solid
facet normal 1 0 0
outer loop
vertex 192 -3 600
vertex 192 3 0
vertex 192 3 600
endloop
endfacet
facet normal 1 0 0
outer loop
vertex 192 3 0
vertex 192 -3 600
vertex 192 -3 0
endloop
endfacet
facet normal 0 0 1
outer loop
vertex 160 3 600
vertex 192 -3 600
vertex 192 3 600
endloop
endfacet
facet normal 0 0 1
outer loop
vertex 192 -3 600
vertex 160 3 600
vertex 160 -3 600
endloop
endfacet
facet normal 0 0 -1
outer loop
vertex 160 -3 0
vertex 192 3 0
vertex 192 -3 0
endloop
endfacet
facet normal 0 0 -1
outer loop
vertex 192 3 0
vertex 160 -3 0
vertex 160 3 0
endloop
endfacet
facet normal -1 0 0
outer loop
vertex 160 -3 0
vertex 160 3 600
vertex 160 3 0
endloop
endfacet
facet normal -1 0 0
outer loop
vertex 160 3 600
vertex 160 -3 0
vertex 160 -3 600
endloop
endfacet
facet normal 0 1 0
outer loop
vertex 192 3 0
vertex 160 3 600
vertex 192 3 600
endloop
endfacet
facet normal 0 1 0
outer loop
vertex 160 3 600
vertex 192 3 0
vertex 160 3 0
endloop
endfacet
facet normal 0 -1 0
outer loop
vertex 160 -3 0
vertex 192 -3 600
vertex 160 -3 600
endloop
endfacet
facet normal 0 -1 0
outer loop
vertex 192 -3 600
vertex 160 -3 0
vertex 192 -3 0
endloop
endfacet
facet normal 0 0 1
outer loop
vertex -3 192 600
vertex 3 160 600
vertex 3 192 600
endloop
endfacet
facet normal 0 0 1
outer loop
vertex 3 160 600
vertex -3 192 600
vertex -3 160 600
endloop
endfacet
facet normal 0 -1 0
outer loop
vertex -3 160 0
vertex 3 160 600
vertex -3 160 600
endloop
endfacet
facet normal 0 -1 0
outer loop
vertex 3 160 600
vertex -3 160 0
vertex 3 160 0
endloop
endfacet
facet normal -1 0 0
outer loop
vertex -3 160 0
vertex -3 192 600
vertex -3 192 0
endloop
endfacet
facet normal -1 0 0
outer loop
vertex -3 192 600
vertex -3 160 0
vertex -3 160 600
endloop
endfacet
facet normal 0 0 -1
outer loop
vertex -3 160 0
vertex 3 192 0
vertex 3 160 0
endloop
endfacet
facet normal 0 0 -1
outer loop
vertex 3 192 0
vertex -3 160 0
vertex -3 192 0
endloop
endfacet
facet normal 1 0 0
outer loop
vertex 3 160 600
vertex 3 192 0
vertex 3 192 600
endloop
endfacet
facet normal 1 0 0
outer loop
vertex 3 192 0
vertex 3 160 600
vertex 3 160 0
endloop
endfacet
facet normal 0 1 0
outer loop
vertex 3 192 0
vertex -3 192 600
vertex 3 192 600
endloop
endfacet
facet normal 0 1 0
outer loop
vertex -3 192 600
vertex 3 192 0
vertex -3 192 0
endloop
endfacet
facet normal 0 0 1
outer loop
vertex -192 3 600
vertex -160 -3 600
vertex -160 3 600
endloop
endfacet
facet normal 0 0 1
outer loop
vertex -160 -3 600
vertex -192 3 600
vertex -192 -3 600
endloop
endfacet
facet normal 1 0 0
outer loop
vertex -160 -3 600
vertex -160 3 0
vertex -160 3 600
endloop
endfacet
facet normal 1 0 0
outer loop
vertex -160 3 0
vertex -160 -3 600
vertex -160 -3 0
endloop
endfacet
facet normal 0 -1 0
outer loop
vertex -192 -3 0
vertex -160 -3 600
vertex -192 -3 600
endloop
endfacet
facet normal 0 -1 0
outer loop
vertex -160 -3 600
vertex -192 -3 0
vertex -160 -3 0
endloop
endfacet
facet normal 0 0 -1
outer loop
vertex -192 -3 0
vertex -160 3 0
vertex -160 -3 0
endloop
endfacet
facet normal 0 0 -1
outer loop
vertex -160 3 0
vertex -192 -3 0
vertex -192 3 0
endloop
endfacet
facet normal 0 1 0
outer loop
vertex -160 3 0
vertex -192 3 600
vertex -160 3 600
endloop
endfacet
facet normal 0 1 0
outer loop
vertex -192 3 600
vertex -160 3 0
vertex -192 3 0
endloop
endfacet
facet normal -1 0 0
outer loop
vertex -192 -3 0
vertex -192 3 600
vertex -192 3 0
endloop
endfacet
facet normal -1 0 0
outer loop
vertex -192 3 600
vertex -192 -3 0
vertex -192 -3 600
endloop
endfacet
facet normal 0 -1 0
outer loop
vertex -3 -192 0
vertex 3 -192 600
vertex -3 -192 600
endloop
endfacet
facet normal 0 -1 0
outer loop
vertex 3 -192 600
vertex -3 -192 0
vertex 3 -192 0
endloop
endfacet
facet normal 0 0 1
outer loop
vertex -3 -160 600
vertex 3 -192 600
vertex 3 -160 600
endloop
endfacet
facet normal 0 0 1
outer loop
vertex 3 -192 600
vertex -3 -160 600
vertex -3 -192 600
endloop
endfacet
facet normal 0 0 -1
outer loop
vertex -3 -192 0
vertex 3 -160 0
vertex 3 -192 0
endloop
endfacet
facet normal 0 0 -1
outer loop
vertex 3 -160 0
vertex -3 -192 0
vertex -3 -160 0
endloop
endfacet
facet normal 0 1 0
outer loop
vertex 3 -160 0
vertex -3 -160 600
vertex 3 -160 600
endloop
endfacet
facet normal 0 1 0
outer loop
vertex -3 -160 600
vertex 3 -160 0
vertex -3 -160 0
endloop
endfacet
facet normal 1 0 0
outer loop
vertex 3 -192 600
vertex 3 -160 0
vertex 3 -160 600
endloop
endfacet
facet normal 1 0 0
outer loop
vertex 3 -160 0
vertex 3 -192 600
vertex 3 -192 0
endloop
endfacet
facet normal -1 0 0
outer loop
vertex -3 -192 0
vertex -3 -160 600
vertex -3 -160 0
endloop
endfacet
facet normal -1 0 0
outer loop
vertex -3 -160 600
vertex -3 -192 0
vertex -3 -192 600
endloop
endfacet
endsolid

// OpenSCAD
/*
    Stirred-Tank Simulation
    Copyright (c) 2021 FelixFebrian

    File baffles.scad
*/

// User Settings
tankDiameter = 400;
tankHeight = 600;

baffleWidth = 32;
baffleThickness = 6;
baffleDistance = 8;

module one_baffle() {
    xTranslation = tankDiameter/2 - baffleWidth - baffleDistance;
    yTranslation = -baffleThickness/2;
    translate([xTranslation, yTranslation, 0])
        cube(size=[baffleWidth, baffleThickness, tankHeight]);
}

module baffles() {
    for (i=[0:90:270]) {
        rotate([0, 0, i]) one_baffle();
    }
}

baffles();
